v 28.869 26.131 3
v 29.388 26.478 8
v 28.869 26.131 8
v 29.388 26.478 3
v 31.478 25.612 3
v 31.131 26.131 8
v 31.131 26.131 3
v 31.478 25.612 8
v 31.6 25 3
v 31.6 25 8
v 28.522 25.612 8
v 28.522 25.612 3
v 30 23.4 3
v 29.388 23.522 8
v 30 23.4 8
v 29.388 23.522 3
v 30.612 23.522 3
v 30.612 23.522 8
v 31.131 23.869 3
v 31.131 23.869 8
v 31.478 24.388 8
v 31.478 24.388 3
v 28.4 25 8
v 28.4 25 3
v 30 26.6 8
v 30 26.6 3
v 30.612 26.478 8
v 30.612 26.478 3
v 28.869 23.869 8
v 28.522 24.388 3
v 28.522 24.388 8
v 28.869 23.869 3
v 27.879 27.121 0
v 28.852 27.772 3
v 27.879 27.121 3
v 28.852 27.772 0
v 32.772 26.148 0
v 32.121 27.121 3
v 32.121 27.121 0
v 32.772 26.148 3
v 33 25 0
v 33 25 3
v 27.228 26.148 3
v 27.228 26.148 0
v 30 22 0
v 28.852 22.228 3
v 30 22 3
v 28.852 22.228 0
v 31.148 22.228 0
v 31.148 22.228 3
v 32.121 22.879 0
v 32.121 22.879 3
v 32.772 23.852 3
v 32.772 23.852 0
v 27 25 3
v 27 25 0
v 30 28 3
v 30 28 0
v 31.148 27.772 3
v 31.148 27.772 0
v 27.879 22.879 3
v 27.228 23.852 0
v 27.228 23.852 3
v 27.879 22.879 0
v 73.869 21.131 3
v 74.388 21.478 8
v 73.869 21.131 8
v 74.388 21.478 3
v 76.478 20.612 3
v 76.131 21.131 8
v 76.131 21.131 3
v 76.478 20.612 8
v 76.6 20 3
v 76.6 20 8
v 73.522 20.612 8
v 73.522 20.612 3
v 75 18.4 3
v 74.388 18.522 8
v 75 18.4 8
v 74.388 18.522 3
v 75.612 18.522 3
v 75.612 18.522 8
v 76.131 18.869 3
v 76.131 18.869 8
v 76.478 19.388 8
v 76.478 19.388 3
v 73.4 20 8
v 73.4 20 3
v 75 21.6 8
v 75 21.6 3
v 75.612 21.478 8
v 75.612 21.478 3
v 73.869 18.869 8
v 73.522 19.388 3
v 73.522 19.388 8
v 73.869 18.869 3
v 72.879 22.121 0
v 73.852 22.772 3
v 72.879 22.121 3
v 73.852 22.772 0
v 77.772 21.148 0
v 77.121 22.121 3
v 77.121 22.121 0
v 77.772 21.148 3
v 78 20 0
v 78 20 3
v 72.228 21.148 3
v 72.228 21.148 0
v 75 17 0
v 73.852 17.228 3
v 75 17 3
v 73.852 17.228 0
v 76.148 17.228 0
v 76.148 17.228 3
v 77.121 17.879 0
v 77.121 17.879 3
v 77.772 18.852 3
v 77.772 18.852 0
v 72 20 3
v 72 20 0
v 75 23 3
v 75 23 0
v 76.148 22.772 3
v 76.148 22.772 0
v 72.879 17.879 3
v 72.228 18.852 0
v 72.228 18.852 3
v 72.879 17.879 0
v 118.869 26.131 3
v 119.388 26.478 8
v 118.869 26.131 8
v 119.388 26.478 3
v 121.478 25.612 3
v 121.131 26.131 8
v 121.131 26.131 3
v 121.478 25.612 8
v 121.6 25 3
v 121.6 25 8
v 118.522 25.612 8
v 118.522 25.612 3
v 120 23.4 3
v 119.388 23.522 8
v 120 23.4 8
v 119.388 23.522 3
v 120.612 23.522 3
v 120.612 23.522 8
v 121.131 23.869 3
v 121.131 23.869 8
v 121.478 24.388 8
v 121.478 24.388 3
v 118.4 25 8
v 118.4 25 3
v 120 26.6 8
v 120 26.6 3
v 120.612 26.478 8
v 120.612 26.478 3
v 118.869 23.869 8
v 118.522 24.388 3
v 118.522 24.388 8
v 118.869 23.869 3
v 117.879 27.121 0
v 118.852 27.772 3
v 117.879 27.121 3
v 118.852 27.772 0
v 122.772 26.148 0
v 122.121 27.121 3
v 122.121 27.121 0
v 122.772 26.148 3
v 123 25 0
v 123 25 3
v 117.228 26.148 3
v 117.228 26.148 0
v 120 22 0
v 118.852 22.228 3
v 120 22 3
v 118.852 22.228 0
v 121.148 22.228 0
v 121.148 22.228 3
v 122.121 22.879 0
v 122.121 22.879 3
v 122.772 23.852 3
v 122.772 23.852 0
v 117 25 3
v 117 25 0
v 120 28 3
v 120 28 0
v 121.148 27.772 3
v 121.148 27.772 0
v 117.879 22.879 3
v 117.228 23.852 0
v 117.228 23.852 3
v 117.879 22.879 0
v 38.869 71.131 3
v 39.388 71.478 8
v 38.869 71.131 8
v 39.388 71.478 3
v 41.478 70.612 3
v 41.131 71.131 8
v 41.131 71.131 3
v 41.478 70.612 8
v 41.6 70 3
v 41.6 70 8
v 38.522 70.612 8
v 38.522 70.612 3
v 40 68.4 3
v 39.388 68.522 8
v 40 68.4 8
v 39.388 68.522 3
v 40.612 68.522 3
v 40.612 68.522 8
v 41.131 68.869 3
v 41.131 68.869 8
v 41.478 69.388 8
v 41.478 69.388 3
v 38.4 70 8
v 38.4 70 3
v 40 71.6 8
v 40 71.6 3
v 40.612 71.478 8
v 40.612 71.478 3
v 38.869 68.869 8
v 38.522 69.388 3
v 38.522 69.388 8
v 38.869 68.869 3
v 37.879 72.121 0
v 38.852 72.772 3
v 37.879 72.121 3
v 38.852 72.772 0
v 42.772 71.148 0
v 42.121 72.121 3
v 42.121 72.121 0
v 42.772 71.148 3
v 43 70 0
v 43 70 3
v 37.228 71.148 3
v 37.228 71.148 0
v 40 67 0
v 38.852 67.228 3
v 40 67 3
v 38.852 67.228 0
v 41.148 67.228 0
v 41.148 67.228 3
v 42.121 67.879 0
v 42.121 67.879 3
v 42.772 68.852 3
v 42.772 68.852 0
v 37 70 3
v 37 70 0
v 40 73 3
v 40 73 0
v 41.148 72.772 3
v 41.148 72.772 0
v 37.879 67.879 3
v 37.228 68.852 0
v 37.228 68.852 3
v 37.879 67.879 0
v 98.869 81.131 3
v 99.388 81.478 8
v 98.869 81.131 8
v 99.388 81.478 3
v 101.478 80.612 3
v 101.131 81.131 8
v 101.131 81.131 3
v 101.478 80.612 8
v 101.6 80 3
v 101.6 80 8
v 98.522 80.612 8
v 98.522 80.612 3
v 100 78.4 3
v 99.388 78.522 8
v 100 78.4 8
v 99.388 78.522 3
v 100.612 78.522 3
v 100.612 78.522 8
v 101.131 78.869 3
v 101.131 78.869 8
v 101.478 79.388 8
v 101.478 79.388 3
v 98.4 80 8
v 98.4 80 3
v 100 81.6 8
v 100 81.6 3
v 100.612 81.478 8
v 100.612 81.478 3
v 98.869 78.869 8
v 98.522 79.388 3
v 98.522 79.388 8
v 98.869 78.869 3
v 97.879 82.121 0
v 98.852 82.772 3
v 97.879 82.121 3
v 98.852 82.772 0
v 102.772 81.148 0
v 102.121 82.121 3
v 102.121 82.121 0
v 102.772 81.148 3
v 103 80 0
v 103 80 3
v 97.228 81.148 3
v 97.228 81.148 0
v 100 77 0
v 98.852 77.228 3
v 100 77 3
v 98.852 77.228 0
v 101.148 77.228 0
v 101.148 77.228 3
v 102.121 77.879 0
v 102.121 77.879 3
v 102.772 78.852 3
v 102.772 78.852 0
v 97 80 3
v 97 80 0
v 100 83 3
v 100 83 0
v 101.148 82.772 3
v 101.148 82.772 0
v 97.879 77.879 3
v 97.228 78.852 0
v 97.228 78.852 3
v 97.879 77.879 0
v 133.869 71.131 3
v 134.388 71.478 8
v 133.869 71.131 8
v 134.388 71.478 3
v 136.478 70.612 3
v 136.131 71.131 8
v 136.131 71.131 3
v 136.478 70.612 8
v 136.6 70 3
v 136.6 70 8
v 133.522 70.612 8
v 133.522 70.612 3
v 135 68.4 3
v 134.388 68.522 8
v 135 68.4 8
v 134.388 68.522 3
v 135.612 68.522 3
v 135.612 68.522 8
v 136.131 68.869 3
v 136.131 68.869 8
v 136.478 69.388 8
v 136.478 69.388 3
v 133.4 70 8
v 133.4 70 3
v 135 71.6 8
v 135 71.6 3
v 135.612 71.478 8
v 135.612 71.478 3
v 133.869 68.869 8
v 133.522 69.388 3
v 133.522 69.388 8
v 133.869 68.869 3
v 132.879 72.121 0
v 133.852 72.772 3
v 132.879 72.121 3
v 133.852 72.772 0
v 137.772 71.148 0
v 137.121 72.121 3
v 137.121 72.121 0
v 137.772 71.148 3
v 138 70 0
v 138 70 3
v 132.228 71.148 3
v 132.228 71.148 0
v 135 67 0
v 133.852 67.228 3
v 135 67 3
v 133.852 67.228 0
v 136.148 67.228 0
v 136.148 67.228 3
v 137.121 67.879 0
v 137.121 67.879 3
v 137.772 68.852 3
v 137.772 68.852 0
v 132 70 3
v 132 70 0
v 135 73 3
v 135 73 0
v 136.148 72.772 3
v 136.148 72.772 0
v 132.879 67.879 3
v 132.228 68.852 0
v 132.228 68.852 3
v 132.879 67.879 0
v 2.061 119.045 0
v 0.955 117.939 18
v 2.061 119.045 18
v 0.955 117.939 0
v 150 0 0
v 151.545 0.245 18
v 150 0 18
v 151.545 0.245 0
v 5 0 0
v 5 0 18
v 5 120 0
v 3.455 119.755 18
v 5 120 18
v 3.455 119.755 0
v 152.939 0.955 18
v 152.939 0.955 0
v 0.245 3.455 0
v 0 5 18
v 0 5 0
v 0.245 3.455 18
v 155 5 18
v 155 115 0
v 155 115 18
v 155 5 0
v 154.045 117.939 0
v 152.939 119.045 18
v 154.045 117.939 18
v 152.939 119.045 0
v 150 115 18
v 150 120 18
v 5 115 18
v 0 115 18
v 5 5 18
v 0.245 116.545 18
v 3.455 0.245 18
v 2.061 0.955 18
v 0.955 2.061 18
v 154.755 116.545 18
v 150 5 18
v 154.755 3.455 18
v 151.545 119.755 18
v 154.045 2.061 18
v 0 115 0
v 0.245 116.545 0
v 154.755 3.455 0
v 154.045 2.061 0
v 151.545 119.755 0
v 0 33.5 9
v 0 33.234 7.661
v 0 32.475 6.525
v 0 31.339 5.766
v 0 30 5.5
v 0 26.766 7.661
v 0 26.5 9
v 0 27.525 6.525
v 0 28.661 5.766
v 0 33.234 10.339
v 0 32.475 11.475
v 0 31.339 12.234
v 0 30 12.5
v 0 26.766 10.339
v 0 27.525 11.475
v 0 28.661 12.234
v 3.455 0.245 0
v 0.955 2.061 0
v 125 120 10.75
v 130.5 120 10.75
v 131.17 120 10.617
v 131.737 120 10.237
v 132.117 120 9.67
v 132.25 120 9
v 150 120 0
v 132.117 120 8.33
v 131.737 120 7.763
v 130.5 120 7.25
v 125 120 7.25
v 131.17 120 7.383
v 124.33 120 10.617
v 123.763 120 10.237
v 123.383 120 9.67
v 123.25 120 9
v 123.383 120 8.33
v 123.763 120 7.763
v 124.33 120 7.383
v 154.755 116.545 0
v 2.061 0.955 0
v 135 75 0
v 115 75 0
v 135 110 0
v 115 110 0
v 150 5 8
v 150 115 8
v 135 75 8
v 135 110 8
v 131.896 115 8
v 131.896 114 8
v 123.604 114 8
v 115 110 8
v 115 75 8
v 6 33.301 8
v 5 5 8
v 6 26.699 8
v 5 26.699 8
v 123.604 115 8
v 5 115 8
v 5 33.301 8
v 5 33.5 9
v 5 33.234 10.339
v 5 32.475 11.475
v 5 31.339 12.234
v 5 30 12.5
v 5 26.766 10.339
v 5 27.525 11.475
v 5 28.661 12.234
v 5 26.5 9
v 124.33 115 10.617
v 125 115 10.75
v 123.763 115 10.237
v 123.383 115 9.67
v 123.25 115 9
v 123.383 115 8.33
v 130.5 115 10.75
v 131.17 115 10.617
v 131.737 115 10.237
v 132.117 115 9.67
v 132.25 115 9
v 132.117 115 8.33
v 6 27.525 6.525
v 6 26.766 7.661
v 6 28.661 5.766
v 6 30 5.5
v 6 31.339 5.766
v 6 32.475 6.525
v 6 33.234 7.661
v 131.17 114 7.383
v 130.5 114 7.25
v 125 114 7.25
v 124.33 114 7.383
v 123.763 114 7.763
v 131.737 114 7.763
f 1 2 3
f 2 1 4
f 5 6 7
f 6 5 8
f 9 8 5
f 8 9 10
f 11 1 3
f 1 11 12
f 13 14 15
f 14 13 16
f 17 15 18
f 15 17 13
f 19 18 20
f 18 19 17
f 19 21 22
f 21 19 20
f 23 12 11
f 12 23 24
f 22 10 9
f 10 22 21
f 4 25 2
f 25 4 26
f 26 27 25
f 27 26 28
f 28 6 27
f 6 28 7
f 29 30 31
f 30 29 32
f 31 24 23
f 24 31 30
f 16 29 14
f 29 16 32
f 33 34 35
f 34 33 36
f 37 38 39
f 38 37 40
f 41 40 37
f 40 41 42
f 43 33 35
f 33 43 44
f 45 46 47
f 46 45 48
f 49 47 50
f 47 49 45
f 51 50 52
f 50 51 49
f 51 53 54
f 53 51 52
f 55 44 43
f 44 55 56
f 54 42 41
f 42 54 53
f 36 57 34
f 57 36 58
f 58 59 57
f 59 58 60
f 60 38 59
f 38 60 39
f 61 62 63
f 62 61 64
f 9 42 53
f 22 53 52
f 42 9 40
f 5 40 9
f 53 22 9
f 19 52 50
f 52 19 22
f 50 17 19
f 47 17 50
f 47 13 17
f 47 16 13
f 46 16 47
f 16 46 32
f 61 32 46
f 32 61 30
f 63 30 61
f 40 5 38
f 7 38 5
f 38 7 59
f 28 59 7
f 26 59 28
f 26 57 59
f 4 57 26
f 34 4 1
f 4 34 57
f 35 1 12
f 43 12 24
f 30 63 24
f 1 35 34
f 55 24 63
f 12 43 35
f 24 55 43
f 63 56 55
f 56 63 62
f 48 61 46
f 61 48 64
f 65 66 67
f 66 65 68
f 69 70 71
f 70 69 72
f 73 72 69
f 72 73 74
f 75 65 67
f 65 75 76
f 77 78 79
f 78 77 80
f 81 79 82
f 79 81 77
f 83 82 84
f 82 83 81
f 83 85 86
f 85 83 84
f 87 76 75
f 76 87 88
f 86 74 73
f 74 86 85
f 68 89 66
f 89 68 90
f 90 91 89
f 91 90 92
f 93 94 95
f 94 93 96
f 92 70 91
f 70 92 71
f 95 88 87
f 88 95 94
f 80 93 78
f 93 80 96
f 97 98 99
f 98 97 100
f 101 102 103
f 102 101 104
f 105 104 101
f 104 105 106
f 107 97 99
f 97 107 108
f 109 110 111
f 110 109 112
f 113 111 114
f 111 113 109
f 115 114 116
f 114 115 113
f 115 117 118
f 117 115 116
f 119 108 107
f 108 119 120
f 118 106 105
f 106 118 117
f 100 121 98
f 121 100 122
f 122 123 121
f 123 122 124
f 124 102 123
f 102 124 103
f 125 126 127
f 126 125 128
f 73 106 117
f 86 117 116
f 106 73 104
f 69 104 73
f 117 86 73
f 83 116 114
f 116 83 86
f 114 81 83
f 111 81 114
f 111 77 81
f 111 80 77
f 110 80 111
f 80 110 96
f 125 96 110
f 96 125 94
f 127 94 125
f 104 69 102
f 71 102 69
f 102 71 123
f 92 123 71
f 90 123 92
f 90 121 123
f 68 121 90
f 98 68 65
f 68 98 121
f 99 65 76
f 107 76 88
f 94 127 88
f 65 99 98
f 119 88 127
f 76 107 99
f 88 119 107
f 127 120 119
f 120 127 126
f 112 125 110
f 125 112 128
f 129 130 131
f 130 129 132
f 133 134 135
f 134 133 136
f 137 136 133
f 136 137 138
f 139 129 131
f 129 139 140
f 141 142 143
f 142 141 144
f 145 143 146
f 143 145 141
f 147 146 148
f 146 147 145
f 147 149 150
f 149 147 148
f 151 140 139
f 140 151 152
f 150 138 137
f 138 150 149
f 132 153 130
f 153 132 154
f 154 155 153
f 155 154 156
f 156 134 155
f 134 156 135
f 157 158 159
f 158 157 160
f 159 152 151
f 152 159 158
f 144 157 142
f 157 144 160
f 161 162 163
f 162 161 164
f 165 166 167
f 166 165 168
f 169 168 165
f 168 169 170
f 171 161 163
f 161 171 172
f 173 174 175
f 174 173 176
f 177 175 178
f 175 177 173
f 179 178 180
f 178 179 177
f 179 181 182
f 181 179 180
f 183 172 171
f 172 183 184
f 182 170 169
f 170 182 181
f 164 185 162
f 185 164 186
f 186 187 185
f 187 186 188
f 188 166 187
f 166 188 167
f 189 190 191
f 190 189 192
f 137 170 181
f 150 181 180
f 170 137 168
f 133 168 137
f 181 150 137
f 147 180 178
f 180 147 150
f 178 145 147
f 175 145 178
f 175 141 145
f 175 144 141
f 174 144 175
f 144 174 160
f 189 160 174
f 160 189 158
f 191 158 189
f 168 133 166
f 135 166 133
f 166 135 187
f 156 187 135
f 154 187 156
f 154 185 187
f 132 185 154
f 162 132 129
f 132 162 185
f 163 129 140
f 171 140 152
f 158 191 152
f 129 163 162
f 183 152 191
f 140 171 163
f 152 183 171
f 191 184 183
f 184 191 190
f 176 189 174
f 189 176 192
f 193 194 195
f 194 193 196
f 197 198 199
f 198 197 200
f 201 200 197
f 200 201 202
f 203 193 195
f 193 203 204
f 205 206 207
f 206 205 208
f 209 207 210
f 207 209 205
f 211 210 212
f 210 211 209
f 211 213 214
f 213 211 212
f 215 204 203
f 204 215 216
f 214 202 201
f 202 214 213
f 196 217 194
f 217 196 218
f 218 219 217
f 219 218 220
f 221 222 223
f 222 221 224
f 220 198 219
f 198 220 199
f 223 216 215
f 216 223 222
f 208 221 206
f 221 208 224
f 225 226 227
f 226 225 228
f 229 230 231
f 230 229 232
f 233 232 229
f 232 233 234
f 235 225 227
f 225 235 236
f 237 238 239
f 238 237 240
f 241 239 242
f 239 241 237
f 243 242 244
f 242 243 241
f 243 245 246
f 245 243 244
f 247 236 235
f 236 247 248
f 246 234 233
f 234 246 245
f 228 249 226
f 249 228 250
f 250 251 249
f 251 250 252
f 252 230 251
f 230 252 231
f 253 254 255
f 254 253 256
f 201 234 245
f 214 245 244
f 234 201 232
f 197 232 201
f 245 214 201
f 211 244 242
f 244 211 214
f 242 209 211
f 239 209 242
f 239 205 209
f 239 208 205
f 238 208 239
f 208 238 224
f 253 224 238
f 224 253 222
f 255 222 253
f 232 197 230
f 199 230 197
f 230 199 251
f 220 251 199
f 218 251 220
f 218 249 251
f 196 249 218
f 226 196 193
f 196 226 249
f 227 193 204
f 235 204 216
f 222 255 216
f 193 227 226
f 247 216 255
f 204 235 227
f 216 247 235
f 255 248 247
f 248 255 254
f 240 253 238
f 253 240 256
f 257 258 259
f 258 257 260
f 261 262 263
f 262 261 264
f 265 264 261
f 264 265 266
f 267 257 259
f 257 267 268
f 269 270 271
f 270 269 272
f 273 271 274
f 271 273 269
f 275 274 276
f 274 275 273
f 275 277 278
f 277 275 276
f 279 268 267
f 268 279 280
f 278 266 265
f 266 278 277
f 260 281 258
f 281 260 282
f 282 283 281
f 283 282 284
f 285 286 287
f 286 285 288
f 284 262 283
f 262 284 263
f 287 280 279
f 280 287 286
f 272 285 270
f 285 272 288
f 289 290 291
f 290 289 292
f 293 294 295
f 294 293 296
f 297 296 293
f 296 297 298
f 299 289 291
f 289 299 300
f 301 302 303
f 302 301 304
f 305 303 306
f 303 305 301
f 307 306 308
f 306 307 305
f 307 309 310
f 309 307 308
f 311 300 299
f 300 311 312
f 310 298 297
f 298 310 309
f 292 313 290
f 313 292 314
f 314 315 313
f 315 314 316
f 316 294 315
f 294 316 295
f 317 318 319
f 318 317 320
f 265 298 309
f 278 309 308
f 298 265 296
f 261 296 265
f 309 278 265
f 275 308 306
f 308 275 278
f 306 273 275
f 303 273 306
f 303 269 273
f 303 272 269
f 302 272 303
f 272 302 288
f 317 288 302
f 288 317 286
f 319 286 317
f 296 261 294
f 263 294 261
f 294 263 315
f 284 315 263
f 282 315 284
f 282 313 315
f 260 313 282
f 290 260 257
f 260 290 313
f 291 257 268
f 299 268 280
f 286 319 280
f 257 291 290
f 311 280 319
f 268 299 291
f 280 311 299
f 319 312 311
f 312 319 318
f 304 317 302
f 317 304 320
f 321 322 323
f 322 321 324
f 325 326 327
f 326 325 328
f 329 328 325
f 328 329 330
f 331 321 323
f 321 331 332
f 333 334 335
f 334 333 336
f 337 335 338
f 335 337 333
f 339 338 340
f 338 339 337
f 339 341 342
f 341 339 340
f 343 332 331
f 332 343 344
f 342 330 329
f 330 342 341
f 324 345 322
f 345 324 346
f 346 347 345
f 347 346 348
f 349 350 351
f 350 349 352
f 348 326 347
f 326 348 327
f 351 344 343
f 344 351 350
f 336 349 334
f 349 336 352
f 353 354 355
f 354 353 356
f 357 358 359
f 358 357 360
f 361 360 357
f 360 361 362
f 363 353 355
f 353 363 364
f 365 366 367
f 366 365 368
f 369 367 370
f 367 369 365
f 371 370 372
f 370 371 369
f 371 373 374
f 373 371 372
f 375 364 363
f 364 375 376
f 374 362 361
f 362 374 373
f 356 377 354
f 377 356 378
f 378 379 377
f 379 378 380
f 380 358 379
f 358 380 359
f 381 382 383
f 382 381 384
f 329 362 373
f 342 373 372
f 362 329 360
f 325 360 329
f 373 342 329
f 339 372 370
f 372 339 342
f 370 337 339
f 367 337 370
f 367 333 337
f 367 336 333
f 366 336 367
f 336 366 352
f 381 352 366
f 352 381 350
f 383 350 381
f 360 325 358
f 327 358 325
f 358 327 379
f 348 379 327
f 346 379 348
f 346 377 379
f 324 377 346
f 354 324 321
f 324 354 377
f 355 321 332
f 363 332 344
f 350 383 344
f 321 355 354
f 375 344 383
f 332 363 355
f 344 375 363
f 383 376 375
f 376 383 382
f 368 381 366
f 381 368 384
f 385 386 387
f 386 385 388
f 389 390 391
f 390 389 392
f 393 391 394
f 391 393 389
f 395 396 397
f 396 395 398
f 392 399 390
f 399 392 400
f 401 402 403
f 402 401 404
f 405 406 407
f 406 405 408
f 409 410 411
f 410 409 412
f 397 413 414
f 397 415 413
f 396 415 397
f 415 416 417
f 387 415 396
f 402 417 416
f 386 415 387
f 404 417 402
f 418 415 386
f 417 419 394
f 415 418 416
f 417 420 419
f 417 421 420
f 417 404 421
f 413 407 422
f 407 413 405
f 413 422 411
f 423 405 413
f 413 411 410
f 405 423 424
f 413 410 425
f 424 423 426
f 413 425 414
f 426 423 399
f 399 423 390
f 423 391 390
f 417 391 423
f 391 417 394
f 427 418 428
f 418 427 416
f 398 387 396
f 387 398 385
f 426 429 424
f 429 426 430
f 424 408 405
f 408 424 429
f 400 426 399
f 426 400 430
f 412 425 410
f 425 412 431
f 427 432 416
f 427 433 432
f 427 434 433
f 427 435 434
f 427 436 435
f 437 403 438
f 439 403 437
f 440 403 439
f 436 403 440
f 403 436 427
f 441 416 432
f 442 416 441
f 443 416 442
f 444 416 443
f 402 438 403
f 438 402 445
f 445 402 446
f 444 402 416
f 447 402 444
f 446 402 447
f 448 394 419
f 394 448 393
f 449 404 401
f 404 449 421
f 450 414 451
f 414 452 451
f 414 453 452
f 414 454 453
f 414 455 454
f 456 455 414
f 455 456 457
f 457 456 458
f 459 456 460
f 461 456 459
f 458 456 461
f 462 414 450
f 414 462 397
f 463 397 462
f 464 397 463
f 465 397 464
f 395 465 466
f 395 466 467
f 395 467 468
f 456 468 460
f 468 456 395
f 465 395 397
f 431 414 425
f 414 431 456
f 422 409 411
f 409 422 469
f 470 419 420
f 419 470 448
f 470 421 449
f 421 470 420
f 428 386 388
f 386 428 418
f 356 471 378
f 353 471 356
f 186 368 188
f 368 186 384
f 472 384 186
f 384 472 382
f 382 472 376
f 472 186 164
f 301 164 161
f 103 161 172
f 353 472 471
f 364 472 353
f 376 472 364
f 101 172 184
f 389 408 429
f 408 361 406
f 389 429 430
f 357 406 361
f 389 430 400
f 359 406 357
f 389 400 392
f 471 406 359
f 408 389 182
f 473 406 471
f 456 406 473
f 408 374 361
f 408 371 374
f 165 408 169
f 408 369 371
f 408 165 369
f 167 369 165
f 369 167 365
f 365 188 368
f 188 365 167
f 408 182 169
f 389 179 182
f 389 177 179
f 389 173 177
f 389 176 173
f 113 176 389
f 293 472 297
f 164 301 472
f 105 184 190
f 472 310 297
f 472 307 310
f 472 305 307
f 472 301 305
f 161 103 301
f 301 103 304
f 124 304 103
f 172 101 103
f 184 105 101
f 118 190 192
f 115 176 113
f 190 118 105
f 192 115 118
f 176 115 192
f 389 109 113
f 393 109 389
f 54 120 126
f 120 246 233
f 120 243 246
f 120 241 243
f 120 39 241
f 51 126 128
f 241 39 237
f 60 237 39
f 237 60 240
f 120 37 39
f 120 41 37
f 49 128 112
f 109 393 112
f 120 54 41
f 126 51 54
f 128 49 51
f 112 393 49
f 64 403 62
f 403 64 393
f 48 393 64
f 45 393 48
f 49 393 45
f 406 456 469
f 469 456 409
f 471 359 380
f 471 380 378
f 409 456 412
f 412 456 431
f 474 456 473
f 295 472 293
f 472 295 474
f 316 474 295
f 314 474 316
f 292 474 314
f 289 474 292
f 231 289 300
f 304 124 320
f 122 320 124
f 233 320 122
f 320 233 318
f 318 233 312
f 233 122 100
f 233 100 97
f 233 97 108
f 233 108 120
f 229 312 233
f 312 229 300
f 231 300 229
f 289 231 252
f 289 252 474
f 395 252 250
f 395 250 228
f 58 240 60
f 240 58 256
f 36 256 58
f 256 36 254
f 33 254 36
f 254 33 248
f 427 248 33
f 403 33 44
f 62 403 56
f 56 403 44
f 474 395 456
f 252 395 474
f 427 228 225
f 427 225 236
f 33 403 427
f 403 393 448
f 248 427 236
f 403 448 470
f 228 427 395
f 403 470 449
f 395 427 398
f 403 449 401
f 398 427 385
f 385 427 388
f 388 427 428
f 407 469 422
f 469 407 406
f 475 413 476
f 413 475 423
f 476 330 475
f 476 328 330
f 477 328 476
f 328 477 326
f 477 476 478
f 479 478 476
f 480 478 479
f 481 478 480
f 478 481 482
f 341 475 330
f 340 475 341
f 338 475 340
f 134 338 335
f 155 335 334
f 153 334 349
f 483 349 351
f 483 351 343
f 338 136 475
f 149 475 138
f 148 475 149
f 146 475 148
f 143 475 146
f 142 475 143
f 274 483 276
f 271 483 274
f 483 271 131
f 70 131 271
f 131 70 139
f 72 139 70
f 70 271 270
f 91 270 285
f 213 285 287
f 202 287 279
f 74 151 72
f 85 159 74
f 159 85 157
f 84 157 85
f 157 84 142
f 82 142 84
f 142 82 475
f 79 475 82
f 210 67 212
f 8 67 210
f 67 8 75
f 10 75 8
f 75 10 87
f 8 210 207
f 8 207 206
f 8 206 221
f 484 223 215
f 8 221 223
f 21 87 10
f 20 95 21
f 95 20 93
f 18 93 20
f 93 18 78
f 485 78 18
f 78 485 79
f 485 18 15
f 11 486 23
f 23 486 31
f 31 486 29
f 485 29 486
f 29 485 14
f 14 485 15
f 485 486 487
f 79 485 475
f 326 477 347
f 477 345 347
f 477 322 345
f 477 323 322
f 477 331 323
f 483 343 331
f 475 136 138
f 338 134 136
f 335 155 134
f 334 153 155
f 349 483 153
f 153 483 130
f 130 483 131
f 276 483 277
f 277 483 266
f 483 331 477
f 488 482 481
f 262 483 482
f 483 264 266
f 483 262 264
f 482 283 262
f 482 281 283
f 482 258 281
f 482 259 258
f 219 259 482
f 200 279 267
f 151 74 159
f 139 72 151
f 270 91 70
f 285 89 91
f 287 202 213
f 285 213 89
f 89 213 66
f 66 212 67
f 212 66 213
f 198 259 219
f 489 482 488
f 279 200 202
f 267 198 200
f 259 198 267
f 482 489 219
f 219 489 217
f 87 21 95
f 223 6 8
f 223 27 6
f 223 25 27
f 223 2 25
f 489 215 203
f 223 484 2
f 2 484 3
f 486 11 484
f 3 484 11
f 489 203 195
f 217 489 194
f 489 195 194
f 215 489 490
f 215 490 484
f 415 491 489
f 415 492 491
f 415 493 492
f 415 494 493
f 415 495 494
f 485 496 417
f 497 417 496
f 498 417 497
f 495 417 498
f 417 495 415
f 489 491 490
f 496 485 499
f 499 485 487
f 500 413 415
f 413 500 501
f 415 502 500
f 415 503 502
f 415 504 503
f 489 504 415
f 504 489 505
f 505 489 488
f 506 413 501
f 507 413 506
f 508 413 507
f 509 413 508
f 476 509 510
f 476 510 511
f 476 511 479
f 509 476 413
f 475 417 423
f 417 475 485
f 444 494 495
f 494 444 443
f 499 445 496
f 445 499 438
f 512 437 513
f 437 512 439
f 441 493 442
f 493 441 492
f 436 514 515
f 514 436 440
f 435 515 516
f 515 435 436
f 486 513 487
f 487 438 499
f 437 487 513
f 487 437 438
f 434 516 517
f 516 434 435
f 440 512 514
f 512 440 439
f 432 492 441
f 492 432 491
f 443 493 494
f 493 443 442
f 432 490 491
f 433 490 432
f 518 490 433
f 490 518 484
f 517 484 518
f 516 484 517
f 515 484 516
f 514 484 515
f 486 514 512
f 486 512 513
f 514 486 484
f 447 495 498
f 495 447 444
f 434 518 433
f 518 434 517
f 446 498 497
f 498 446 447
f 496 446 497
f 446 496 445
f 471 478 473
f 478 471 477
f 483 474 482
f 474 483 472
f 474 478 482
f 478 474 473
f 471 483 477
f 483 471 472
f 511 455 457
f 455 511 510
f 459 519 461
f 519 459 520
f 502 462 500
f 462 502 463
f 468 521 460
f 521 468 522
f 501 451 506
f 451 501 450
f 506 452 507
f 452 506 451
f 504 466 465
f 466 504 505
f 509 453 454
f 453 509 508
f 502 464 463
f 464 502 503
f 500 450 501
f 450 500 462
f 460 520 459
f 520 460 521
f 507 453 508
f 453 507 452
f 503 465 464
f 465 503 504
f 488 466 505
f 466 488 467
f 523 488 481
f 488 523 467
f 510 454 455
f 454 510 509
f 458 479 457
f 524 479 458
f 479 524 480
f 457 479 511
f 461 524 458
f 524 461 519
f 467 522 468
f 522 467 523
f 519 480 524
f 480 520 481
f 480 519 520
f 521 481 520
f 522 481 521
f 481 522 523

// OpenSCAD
// Lily58 Wooden Keyboard Case - Left Half
// Tray Mount Design for CNC/3D Printing
// Generate STL: Open in OpenSCAD and press F6, then Export as STL

// === PARAMETERS ===
// Adjust these values for your specific needs
case_length = 155;        // External length (mm)
case_width = 120;         // External width (mm) 
case_height = 18;         // Total case height (mm)
wall_thickness = 5;       // Wall thickness (mm)
bottom_thickness = 8;     // Bottom thickness (mm)
cavity_depth = 12;        // Internal cavity depth (mm)

// Mounting hole parameters
standoff_hole_dia = 3.2;  // M3 clearance holes
countersink_dia = 6;      // Countersink diameter for screw heads
countersink_depth = 3;    // Countersink depth

// Cutout dimensions
trrs_hole_dia = 7;        // TRRS jack hole
promicro_width = 20;      // Pro Micro cutout width
promicro_height = 35;     // Pro Micro cutout height
usb_width = 9;            // USB-C cutout width
usb_height = 3.5;         // USB-C cutout height

// === MOUNTING HOLE POSITIONS ===
// Adjust these coordinates to match your PCB's mounting holes
mounting_holes = [
    [30, 25],     // Hole 1
    [75, 20],     // Hole 2
    [120, 25],    // Hole 3
    [40, 70],     // Hole 4
    [100, 80],    // Hole 5
    [135, 70]     // Hole 6
];

// === MAIN CASE MODULE ===
module lily58_case() {
    difference() {
        // Main case body (rounded rectangle)
        hull() {
            translate([5, 5, 0]) 
                cylinder(r=5, h=case_height, $fn=20);
            translate([case_length-5, 5, 0]) 
                cylinder(r=5, h=case_height, $fn=20);
            translate([5, case_width-5, 0]) 
                cylinder(r=5, h=case_height, $fn=20);
            translate([case_length-5, case_width-5, 0]) 
                cylinder(r=5, h=case_height, $fn=20);
        }
        
        // Internal cavity
        translate([wall_thickness, wall_thickness, bottom_thickness])
            cube([
                case_length - (2 * wall_thickness), 
                case_width - (2 * wall_thickness), 
                cavity_depth + 1
            ]);
        
        // Mounting holes with countersinks
        for (hole = mounting_holes) {
            translate([hole[0], hole[1], 0]) {
                // Through hole
                cylinder(d=standoff_hole_dia, h=case_height+2, $fn=16);
                // Countersink from bottom
                translate([0, 0, -1])
                    cylinder(d=countersink_dia, h=countersink_depth+1, $fn=16);
            }
        }
        
        // TRRS jack cutout (side edge)
        translate([-1, 30, case_height/2])
            rotate([0, 90, 0])
                cylinder(d=trrs_hole_dia, h=wall_thickness+2, $fn=16);
        
        // Pro Micro access cutout
        translate([case_length - 40, case_width - 45, -1])
            cube([promicro_width, promicro_height, bottom_thickness+2]);
        
        // USB-C cutout (back edge)
        translate([case_length - 30, case_width+1, case_height/2])
            rotate([90, 0, 0])
                hull() {
                    cylinder(d=usb_height, h=wall_thickness+2, $fn=16);
                    translate([usb_width-usb_height, 0, 0])
                        cylinder(d=usb_height, h=wall_thickness+2, $fn=16);
                }
    }
}

// === GENERATE THE CASE ===
lily58_case();

// === OPTIONAL: Show PCB outline for reference ===
// Uncomment the next line to see PCB position
// translate([wall_thickness, wall_thickness, bottom_thickness + 2]) 
//     cube([case_length - (2 * wall_thickness), case_width - (2 * wall_thickness), 1.6]);

// === NOTES FOR CUSTOMIZATION ===
/*
TO CUSTOMIZE FOR YOUR SPECIFIC LILY58:
1. Measure your PCB mounting holes
2. Update the mounting_holes array with exact coordinates
3. Adjust cutout positions for your specific PCB layout
4. Test print a small section first to verify fit

TO GENERATE STL:
1. Install OpenSCAD (free from openscad.org)
2. Open this file in OpenSCAD
3. Press F6 to render
4. File → Export → Export as STL

FOR CNC MACHINING:
- Use case_height = 18 for solid wood block
- Machine from top down, leaving bottom thickness intact
- Consider adding registration features for flip operations

FOR 3D PRINTING:
- Print upside down (open cavity facing up)
- Add support for overhangs if needed
- Consider splitting into top/bottom halves for large printers
*/
